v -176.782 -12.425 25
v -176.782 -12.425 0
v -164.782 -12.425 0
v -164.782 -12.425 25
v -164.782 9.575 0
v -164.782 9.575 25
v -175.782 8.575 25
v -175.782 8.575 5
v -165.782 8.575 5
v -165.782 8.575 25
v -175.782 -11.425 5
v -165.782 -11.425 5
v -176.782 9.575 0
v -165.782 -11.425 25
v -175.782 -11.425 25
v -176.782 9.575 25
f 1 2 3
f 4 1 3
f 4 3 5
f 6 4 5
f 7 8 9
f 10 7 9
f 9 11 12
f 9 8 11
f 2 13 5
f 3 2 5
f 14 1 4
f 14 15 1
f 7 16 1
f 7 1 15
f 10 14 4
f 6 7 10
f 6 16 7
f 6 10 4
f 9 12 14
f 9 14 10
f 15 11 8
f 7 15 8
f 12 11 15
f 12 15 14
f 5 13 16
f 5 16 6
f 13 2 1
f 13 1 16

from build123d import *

# Parameters (mm, degrees)
F0_W     = 12
F0_H     = 22
F0_W_2   = 10
F0_H_2   = 20
F1_DEPTH = 5
F2_DEPTH = 25


with BuildPart() as f1:
    # F0 (on Top) → F1 (new body)
    with BuildSketch(Plane.XY):
        with Locations((-170.7817282314, -1.4250520304)):
            Rectangle(F0_W, F0_H)
        with Locations((-170.7817282314, -1.4250520304)):
            Rectangle(F0_W_2, F0_H_2, mode=Mode.SUBTRACT)
        with Locations((-170.7817282314, -1.4250520304)):
            Rectangle(F0_W_2, F0_H_2)
    extrude(amount=F1_DEPTH)

    # F0 (on Top) → F2 (join)
    with BuildSketch(Plane.XY):
        with Locations((-170.7817282314, -1.4250520304)):
            Rectangle(F0_W, F0_H)
        with Locations((-170.7817282314, -1.4250520304)):
            Rectangle(F0_W_2, F0_H_2, mode=Mode.SUBTRACT)
    extrude(amount=F2_DEPTH)


solid = f1.part
